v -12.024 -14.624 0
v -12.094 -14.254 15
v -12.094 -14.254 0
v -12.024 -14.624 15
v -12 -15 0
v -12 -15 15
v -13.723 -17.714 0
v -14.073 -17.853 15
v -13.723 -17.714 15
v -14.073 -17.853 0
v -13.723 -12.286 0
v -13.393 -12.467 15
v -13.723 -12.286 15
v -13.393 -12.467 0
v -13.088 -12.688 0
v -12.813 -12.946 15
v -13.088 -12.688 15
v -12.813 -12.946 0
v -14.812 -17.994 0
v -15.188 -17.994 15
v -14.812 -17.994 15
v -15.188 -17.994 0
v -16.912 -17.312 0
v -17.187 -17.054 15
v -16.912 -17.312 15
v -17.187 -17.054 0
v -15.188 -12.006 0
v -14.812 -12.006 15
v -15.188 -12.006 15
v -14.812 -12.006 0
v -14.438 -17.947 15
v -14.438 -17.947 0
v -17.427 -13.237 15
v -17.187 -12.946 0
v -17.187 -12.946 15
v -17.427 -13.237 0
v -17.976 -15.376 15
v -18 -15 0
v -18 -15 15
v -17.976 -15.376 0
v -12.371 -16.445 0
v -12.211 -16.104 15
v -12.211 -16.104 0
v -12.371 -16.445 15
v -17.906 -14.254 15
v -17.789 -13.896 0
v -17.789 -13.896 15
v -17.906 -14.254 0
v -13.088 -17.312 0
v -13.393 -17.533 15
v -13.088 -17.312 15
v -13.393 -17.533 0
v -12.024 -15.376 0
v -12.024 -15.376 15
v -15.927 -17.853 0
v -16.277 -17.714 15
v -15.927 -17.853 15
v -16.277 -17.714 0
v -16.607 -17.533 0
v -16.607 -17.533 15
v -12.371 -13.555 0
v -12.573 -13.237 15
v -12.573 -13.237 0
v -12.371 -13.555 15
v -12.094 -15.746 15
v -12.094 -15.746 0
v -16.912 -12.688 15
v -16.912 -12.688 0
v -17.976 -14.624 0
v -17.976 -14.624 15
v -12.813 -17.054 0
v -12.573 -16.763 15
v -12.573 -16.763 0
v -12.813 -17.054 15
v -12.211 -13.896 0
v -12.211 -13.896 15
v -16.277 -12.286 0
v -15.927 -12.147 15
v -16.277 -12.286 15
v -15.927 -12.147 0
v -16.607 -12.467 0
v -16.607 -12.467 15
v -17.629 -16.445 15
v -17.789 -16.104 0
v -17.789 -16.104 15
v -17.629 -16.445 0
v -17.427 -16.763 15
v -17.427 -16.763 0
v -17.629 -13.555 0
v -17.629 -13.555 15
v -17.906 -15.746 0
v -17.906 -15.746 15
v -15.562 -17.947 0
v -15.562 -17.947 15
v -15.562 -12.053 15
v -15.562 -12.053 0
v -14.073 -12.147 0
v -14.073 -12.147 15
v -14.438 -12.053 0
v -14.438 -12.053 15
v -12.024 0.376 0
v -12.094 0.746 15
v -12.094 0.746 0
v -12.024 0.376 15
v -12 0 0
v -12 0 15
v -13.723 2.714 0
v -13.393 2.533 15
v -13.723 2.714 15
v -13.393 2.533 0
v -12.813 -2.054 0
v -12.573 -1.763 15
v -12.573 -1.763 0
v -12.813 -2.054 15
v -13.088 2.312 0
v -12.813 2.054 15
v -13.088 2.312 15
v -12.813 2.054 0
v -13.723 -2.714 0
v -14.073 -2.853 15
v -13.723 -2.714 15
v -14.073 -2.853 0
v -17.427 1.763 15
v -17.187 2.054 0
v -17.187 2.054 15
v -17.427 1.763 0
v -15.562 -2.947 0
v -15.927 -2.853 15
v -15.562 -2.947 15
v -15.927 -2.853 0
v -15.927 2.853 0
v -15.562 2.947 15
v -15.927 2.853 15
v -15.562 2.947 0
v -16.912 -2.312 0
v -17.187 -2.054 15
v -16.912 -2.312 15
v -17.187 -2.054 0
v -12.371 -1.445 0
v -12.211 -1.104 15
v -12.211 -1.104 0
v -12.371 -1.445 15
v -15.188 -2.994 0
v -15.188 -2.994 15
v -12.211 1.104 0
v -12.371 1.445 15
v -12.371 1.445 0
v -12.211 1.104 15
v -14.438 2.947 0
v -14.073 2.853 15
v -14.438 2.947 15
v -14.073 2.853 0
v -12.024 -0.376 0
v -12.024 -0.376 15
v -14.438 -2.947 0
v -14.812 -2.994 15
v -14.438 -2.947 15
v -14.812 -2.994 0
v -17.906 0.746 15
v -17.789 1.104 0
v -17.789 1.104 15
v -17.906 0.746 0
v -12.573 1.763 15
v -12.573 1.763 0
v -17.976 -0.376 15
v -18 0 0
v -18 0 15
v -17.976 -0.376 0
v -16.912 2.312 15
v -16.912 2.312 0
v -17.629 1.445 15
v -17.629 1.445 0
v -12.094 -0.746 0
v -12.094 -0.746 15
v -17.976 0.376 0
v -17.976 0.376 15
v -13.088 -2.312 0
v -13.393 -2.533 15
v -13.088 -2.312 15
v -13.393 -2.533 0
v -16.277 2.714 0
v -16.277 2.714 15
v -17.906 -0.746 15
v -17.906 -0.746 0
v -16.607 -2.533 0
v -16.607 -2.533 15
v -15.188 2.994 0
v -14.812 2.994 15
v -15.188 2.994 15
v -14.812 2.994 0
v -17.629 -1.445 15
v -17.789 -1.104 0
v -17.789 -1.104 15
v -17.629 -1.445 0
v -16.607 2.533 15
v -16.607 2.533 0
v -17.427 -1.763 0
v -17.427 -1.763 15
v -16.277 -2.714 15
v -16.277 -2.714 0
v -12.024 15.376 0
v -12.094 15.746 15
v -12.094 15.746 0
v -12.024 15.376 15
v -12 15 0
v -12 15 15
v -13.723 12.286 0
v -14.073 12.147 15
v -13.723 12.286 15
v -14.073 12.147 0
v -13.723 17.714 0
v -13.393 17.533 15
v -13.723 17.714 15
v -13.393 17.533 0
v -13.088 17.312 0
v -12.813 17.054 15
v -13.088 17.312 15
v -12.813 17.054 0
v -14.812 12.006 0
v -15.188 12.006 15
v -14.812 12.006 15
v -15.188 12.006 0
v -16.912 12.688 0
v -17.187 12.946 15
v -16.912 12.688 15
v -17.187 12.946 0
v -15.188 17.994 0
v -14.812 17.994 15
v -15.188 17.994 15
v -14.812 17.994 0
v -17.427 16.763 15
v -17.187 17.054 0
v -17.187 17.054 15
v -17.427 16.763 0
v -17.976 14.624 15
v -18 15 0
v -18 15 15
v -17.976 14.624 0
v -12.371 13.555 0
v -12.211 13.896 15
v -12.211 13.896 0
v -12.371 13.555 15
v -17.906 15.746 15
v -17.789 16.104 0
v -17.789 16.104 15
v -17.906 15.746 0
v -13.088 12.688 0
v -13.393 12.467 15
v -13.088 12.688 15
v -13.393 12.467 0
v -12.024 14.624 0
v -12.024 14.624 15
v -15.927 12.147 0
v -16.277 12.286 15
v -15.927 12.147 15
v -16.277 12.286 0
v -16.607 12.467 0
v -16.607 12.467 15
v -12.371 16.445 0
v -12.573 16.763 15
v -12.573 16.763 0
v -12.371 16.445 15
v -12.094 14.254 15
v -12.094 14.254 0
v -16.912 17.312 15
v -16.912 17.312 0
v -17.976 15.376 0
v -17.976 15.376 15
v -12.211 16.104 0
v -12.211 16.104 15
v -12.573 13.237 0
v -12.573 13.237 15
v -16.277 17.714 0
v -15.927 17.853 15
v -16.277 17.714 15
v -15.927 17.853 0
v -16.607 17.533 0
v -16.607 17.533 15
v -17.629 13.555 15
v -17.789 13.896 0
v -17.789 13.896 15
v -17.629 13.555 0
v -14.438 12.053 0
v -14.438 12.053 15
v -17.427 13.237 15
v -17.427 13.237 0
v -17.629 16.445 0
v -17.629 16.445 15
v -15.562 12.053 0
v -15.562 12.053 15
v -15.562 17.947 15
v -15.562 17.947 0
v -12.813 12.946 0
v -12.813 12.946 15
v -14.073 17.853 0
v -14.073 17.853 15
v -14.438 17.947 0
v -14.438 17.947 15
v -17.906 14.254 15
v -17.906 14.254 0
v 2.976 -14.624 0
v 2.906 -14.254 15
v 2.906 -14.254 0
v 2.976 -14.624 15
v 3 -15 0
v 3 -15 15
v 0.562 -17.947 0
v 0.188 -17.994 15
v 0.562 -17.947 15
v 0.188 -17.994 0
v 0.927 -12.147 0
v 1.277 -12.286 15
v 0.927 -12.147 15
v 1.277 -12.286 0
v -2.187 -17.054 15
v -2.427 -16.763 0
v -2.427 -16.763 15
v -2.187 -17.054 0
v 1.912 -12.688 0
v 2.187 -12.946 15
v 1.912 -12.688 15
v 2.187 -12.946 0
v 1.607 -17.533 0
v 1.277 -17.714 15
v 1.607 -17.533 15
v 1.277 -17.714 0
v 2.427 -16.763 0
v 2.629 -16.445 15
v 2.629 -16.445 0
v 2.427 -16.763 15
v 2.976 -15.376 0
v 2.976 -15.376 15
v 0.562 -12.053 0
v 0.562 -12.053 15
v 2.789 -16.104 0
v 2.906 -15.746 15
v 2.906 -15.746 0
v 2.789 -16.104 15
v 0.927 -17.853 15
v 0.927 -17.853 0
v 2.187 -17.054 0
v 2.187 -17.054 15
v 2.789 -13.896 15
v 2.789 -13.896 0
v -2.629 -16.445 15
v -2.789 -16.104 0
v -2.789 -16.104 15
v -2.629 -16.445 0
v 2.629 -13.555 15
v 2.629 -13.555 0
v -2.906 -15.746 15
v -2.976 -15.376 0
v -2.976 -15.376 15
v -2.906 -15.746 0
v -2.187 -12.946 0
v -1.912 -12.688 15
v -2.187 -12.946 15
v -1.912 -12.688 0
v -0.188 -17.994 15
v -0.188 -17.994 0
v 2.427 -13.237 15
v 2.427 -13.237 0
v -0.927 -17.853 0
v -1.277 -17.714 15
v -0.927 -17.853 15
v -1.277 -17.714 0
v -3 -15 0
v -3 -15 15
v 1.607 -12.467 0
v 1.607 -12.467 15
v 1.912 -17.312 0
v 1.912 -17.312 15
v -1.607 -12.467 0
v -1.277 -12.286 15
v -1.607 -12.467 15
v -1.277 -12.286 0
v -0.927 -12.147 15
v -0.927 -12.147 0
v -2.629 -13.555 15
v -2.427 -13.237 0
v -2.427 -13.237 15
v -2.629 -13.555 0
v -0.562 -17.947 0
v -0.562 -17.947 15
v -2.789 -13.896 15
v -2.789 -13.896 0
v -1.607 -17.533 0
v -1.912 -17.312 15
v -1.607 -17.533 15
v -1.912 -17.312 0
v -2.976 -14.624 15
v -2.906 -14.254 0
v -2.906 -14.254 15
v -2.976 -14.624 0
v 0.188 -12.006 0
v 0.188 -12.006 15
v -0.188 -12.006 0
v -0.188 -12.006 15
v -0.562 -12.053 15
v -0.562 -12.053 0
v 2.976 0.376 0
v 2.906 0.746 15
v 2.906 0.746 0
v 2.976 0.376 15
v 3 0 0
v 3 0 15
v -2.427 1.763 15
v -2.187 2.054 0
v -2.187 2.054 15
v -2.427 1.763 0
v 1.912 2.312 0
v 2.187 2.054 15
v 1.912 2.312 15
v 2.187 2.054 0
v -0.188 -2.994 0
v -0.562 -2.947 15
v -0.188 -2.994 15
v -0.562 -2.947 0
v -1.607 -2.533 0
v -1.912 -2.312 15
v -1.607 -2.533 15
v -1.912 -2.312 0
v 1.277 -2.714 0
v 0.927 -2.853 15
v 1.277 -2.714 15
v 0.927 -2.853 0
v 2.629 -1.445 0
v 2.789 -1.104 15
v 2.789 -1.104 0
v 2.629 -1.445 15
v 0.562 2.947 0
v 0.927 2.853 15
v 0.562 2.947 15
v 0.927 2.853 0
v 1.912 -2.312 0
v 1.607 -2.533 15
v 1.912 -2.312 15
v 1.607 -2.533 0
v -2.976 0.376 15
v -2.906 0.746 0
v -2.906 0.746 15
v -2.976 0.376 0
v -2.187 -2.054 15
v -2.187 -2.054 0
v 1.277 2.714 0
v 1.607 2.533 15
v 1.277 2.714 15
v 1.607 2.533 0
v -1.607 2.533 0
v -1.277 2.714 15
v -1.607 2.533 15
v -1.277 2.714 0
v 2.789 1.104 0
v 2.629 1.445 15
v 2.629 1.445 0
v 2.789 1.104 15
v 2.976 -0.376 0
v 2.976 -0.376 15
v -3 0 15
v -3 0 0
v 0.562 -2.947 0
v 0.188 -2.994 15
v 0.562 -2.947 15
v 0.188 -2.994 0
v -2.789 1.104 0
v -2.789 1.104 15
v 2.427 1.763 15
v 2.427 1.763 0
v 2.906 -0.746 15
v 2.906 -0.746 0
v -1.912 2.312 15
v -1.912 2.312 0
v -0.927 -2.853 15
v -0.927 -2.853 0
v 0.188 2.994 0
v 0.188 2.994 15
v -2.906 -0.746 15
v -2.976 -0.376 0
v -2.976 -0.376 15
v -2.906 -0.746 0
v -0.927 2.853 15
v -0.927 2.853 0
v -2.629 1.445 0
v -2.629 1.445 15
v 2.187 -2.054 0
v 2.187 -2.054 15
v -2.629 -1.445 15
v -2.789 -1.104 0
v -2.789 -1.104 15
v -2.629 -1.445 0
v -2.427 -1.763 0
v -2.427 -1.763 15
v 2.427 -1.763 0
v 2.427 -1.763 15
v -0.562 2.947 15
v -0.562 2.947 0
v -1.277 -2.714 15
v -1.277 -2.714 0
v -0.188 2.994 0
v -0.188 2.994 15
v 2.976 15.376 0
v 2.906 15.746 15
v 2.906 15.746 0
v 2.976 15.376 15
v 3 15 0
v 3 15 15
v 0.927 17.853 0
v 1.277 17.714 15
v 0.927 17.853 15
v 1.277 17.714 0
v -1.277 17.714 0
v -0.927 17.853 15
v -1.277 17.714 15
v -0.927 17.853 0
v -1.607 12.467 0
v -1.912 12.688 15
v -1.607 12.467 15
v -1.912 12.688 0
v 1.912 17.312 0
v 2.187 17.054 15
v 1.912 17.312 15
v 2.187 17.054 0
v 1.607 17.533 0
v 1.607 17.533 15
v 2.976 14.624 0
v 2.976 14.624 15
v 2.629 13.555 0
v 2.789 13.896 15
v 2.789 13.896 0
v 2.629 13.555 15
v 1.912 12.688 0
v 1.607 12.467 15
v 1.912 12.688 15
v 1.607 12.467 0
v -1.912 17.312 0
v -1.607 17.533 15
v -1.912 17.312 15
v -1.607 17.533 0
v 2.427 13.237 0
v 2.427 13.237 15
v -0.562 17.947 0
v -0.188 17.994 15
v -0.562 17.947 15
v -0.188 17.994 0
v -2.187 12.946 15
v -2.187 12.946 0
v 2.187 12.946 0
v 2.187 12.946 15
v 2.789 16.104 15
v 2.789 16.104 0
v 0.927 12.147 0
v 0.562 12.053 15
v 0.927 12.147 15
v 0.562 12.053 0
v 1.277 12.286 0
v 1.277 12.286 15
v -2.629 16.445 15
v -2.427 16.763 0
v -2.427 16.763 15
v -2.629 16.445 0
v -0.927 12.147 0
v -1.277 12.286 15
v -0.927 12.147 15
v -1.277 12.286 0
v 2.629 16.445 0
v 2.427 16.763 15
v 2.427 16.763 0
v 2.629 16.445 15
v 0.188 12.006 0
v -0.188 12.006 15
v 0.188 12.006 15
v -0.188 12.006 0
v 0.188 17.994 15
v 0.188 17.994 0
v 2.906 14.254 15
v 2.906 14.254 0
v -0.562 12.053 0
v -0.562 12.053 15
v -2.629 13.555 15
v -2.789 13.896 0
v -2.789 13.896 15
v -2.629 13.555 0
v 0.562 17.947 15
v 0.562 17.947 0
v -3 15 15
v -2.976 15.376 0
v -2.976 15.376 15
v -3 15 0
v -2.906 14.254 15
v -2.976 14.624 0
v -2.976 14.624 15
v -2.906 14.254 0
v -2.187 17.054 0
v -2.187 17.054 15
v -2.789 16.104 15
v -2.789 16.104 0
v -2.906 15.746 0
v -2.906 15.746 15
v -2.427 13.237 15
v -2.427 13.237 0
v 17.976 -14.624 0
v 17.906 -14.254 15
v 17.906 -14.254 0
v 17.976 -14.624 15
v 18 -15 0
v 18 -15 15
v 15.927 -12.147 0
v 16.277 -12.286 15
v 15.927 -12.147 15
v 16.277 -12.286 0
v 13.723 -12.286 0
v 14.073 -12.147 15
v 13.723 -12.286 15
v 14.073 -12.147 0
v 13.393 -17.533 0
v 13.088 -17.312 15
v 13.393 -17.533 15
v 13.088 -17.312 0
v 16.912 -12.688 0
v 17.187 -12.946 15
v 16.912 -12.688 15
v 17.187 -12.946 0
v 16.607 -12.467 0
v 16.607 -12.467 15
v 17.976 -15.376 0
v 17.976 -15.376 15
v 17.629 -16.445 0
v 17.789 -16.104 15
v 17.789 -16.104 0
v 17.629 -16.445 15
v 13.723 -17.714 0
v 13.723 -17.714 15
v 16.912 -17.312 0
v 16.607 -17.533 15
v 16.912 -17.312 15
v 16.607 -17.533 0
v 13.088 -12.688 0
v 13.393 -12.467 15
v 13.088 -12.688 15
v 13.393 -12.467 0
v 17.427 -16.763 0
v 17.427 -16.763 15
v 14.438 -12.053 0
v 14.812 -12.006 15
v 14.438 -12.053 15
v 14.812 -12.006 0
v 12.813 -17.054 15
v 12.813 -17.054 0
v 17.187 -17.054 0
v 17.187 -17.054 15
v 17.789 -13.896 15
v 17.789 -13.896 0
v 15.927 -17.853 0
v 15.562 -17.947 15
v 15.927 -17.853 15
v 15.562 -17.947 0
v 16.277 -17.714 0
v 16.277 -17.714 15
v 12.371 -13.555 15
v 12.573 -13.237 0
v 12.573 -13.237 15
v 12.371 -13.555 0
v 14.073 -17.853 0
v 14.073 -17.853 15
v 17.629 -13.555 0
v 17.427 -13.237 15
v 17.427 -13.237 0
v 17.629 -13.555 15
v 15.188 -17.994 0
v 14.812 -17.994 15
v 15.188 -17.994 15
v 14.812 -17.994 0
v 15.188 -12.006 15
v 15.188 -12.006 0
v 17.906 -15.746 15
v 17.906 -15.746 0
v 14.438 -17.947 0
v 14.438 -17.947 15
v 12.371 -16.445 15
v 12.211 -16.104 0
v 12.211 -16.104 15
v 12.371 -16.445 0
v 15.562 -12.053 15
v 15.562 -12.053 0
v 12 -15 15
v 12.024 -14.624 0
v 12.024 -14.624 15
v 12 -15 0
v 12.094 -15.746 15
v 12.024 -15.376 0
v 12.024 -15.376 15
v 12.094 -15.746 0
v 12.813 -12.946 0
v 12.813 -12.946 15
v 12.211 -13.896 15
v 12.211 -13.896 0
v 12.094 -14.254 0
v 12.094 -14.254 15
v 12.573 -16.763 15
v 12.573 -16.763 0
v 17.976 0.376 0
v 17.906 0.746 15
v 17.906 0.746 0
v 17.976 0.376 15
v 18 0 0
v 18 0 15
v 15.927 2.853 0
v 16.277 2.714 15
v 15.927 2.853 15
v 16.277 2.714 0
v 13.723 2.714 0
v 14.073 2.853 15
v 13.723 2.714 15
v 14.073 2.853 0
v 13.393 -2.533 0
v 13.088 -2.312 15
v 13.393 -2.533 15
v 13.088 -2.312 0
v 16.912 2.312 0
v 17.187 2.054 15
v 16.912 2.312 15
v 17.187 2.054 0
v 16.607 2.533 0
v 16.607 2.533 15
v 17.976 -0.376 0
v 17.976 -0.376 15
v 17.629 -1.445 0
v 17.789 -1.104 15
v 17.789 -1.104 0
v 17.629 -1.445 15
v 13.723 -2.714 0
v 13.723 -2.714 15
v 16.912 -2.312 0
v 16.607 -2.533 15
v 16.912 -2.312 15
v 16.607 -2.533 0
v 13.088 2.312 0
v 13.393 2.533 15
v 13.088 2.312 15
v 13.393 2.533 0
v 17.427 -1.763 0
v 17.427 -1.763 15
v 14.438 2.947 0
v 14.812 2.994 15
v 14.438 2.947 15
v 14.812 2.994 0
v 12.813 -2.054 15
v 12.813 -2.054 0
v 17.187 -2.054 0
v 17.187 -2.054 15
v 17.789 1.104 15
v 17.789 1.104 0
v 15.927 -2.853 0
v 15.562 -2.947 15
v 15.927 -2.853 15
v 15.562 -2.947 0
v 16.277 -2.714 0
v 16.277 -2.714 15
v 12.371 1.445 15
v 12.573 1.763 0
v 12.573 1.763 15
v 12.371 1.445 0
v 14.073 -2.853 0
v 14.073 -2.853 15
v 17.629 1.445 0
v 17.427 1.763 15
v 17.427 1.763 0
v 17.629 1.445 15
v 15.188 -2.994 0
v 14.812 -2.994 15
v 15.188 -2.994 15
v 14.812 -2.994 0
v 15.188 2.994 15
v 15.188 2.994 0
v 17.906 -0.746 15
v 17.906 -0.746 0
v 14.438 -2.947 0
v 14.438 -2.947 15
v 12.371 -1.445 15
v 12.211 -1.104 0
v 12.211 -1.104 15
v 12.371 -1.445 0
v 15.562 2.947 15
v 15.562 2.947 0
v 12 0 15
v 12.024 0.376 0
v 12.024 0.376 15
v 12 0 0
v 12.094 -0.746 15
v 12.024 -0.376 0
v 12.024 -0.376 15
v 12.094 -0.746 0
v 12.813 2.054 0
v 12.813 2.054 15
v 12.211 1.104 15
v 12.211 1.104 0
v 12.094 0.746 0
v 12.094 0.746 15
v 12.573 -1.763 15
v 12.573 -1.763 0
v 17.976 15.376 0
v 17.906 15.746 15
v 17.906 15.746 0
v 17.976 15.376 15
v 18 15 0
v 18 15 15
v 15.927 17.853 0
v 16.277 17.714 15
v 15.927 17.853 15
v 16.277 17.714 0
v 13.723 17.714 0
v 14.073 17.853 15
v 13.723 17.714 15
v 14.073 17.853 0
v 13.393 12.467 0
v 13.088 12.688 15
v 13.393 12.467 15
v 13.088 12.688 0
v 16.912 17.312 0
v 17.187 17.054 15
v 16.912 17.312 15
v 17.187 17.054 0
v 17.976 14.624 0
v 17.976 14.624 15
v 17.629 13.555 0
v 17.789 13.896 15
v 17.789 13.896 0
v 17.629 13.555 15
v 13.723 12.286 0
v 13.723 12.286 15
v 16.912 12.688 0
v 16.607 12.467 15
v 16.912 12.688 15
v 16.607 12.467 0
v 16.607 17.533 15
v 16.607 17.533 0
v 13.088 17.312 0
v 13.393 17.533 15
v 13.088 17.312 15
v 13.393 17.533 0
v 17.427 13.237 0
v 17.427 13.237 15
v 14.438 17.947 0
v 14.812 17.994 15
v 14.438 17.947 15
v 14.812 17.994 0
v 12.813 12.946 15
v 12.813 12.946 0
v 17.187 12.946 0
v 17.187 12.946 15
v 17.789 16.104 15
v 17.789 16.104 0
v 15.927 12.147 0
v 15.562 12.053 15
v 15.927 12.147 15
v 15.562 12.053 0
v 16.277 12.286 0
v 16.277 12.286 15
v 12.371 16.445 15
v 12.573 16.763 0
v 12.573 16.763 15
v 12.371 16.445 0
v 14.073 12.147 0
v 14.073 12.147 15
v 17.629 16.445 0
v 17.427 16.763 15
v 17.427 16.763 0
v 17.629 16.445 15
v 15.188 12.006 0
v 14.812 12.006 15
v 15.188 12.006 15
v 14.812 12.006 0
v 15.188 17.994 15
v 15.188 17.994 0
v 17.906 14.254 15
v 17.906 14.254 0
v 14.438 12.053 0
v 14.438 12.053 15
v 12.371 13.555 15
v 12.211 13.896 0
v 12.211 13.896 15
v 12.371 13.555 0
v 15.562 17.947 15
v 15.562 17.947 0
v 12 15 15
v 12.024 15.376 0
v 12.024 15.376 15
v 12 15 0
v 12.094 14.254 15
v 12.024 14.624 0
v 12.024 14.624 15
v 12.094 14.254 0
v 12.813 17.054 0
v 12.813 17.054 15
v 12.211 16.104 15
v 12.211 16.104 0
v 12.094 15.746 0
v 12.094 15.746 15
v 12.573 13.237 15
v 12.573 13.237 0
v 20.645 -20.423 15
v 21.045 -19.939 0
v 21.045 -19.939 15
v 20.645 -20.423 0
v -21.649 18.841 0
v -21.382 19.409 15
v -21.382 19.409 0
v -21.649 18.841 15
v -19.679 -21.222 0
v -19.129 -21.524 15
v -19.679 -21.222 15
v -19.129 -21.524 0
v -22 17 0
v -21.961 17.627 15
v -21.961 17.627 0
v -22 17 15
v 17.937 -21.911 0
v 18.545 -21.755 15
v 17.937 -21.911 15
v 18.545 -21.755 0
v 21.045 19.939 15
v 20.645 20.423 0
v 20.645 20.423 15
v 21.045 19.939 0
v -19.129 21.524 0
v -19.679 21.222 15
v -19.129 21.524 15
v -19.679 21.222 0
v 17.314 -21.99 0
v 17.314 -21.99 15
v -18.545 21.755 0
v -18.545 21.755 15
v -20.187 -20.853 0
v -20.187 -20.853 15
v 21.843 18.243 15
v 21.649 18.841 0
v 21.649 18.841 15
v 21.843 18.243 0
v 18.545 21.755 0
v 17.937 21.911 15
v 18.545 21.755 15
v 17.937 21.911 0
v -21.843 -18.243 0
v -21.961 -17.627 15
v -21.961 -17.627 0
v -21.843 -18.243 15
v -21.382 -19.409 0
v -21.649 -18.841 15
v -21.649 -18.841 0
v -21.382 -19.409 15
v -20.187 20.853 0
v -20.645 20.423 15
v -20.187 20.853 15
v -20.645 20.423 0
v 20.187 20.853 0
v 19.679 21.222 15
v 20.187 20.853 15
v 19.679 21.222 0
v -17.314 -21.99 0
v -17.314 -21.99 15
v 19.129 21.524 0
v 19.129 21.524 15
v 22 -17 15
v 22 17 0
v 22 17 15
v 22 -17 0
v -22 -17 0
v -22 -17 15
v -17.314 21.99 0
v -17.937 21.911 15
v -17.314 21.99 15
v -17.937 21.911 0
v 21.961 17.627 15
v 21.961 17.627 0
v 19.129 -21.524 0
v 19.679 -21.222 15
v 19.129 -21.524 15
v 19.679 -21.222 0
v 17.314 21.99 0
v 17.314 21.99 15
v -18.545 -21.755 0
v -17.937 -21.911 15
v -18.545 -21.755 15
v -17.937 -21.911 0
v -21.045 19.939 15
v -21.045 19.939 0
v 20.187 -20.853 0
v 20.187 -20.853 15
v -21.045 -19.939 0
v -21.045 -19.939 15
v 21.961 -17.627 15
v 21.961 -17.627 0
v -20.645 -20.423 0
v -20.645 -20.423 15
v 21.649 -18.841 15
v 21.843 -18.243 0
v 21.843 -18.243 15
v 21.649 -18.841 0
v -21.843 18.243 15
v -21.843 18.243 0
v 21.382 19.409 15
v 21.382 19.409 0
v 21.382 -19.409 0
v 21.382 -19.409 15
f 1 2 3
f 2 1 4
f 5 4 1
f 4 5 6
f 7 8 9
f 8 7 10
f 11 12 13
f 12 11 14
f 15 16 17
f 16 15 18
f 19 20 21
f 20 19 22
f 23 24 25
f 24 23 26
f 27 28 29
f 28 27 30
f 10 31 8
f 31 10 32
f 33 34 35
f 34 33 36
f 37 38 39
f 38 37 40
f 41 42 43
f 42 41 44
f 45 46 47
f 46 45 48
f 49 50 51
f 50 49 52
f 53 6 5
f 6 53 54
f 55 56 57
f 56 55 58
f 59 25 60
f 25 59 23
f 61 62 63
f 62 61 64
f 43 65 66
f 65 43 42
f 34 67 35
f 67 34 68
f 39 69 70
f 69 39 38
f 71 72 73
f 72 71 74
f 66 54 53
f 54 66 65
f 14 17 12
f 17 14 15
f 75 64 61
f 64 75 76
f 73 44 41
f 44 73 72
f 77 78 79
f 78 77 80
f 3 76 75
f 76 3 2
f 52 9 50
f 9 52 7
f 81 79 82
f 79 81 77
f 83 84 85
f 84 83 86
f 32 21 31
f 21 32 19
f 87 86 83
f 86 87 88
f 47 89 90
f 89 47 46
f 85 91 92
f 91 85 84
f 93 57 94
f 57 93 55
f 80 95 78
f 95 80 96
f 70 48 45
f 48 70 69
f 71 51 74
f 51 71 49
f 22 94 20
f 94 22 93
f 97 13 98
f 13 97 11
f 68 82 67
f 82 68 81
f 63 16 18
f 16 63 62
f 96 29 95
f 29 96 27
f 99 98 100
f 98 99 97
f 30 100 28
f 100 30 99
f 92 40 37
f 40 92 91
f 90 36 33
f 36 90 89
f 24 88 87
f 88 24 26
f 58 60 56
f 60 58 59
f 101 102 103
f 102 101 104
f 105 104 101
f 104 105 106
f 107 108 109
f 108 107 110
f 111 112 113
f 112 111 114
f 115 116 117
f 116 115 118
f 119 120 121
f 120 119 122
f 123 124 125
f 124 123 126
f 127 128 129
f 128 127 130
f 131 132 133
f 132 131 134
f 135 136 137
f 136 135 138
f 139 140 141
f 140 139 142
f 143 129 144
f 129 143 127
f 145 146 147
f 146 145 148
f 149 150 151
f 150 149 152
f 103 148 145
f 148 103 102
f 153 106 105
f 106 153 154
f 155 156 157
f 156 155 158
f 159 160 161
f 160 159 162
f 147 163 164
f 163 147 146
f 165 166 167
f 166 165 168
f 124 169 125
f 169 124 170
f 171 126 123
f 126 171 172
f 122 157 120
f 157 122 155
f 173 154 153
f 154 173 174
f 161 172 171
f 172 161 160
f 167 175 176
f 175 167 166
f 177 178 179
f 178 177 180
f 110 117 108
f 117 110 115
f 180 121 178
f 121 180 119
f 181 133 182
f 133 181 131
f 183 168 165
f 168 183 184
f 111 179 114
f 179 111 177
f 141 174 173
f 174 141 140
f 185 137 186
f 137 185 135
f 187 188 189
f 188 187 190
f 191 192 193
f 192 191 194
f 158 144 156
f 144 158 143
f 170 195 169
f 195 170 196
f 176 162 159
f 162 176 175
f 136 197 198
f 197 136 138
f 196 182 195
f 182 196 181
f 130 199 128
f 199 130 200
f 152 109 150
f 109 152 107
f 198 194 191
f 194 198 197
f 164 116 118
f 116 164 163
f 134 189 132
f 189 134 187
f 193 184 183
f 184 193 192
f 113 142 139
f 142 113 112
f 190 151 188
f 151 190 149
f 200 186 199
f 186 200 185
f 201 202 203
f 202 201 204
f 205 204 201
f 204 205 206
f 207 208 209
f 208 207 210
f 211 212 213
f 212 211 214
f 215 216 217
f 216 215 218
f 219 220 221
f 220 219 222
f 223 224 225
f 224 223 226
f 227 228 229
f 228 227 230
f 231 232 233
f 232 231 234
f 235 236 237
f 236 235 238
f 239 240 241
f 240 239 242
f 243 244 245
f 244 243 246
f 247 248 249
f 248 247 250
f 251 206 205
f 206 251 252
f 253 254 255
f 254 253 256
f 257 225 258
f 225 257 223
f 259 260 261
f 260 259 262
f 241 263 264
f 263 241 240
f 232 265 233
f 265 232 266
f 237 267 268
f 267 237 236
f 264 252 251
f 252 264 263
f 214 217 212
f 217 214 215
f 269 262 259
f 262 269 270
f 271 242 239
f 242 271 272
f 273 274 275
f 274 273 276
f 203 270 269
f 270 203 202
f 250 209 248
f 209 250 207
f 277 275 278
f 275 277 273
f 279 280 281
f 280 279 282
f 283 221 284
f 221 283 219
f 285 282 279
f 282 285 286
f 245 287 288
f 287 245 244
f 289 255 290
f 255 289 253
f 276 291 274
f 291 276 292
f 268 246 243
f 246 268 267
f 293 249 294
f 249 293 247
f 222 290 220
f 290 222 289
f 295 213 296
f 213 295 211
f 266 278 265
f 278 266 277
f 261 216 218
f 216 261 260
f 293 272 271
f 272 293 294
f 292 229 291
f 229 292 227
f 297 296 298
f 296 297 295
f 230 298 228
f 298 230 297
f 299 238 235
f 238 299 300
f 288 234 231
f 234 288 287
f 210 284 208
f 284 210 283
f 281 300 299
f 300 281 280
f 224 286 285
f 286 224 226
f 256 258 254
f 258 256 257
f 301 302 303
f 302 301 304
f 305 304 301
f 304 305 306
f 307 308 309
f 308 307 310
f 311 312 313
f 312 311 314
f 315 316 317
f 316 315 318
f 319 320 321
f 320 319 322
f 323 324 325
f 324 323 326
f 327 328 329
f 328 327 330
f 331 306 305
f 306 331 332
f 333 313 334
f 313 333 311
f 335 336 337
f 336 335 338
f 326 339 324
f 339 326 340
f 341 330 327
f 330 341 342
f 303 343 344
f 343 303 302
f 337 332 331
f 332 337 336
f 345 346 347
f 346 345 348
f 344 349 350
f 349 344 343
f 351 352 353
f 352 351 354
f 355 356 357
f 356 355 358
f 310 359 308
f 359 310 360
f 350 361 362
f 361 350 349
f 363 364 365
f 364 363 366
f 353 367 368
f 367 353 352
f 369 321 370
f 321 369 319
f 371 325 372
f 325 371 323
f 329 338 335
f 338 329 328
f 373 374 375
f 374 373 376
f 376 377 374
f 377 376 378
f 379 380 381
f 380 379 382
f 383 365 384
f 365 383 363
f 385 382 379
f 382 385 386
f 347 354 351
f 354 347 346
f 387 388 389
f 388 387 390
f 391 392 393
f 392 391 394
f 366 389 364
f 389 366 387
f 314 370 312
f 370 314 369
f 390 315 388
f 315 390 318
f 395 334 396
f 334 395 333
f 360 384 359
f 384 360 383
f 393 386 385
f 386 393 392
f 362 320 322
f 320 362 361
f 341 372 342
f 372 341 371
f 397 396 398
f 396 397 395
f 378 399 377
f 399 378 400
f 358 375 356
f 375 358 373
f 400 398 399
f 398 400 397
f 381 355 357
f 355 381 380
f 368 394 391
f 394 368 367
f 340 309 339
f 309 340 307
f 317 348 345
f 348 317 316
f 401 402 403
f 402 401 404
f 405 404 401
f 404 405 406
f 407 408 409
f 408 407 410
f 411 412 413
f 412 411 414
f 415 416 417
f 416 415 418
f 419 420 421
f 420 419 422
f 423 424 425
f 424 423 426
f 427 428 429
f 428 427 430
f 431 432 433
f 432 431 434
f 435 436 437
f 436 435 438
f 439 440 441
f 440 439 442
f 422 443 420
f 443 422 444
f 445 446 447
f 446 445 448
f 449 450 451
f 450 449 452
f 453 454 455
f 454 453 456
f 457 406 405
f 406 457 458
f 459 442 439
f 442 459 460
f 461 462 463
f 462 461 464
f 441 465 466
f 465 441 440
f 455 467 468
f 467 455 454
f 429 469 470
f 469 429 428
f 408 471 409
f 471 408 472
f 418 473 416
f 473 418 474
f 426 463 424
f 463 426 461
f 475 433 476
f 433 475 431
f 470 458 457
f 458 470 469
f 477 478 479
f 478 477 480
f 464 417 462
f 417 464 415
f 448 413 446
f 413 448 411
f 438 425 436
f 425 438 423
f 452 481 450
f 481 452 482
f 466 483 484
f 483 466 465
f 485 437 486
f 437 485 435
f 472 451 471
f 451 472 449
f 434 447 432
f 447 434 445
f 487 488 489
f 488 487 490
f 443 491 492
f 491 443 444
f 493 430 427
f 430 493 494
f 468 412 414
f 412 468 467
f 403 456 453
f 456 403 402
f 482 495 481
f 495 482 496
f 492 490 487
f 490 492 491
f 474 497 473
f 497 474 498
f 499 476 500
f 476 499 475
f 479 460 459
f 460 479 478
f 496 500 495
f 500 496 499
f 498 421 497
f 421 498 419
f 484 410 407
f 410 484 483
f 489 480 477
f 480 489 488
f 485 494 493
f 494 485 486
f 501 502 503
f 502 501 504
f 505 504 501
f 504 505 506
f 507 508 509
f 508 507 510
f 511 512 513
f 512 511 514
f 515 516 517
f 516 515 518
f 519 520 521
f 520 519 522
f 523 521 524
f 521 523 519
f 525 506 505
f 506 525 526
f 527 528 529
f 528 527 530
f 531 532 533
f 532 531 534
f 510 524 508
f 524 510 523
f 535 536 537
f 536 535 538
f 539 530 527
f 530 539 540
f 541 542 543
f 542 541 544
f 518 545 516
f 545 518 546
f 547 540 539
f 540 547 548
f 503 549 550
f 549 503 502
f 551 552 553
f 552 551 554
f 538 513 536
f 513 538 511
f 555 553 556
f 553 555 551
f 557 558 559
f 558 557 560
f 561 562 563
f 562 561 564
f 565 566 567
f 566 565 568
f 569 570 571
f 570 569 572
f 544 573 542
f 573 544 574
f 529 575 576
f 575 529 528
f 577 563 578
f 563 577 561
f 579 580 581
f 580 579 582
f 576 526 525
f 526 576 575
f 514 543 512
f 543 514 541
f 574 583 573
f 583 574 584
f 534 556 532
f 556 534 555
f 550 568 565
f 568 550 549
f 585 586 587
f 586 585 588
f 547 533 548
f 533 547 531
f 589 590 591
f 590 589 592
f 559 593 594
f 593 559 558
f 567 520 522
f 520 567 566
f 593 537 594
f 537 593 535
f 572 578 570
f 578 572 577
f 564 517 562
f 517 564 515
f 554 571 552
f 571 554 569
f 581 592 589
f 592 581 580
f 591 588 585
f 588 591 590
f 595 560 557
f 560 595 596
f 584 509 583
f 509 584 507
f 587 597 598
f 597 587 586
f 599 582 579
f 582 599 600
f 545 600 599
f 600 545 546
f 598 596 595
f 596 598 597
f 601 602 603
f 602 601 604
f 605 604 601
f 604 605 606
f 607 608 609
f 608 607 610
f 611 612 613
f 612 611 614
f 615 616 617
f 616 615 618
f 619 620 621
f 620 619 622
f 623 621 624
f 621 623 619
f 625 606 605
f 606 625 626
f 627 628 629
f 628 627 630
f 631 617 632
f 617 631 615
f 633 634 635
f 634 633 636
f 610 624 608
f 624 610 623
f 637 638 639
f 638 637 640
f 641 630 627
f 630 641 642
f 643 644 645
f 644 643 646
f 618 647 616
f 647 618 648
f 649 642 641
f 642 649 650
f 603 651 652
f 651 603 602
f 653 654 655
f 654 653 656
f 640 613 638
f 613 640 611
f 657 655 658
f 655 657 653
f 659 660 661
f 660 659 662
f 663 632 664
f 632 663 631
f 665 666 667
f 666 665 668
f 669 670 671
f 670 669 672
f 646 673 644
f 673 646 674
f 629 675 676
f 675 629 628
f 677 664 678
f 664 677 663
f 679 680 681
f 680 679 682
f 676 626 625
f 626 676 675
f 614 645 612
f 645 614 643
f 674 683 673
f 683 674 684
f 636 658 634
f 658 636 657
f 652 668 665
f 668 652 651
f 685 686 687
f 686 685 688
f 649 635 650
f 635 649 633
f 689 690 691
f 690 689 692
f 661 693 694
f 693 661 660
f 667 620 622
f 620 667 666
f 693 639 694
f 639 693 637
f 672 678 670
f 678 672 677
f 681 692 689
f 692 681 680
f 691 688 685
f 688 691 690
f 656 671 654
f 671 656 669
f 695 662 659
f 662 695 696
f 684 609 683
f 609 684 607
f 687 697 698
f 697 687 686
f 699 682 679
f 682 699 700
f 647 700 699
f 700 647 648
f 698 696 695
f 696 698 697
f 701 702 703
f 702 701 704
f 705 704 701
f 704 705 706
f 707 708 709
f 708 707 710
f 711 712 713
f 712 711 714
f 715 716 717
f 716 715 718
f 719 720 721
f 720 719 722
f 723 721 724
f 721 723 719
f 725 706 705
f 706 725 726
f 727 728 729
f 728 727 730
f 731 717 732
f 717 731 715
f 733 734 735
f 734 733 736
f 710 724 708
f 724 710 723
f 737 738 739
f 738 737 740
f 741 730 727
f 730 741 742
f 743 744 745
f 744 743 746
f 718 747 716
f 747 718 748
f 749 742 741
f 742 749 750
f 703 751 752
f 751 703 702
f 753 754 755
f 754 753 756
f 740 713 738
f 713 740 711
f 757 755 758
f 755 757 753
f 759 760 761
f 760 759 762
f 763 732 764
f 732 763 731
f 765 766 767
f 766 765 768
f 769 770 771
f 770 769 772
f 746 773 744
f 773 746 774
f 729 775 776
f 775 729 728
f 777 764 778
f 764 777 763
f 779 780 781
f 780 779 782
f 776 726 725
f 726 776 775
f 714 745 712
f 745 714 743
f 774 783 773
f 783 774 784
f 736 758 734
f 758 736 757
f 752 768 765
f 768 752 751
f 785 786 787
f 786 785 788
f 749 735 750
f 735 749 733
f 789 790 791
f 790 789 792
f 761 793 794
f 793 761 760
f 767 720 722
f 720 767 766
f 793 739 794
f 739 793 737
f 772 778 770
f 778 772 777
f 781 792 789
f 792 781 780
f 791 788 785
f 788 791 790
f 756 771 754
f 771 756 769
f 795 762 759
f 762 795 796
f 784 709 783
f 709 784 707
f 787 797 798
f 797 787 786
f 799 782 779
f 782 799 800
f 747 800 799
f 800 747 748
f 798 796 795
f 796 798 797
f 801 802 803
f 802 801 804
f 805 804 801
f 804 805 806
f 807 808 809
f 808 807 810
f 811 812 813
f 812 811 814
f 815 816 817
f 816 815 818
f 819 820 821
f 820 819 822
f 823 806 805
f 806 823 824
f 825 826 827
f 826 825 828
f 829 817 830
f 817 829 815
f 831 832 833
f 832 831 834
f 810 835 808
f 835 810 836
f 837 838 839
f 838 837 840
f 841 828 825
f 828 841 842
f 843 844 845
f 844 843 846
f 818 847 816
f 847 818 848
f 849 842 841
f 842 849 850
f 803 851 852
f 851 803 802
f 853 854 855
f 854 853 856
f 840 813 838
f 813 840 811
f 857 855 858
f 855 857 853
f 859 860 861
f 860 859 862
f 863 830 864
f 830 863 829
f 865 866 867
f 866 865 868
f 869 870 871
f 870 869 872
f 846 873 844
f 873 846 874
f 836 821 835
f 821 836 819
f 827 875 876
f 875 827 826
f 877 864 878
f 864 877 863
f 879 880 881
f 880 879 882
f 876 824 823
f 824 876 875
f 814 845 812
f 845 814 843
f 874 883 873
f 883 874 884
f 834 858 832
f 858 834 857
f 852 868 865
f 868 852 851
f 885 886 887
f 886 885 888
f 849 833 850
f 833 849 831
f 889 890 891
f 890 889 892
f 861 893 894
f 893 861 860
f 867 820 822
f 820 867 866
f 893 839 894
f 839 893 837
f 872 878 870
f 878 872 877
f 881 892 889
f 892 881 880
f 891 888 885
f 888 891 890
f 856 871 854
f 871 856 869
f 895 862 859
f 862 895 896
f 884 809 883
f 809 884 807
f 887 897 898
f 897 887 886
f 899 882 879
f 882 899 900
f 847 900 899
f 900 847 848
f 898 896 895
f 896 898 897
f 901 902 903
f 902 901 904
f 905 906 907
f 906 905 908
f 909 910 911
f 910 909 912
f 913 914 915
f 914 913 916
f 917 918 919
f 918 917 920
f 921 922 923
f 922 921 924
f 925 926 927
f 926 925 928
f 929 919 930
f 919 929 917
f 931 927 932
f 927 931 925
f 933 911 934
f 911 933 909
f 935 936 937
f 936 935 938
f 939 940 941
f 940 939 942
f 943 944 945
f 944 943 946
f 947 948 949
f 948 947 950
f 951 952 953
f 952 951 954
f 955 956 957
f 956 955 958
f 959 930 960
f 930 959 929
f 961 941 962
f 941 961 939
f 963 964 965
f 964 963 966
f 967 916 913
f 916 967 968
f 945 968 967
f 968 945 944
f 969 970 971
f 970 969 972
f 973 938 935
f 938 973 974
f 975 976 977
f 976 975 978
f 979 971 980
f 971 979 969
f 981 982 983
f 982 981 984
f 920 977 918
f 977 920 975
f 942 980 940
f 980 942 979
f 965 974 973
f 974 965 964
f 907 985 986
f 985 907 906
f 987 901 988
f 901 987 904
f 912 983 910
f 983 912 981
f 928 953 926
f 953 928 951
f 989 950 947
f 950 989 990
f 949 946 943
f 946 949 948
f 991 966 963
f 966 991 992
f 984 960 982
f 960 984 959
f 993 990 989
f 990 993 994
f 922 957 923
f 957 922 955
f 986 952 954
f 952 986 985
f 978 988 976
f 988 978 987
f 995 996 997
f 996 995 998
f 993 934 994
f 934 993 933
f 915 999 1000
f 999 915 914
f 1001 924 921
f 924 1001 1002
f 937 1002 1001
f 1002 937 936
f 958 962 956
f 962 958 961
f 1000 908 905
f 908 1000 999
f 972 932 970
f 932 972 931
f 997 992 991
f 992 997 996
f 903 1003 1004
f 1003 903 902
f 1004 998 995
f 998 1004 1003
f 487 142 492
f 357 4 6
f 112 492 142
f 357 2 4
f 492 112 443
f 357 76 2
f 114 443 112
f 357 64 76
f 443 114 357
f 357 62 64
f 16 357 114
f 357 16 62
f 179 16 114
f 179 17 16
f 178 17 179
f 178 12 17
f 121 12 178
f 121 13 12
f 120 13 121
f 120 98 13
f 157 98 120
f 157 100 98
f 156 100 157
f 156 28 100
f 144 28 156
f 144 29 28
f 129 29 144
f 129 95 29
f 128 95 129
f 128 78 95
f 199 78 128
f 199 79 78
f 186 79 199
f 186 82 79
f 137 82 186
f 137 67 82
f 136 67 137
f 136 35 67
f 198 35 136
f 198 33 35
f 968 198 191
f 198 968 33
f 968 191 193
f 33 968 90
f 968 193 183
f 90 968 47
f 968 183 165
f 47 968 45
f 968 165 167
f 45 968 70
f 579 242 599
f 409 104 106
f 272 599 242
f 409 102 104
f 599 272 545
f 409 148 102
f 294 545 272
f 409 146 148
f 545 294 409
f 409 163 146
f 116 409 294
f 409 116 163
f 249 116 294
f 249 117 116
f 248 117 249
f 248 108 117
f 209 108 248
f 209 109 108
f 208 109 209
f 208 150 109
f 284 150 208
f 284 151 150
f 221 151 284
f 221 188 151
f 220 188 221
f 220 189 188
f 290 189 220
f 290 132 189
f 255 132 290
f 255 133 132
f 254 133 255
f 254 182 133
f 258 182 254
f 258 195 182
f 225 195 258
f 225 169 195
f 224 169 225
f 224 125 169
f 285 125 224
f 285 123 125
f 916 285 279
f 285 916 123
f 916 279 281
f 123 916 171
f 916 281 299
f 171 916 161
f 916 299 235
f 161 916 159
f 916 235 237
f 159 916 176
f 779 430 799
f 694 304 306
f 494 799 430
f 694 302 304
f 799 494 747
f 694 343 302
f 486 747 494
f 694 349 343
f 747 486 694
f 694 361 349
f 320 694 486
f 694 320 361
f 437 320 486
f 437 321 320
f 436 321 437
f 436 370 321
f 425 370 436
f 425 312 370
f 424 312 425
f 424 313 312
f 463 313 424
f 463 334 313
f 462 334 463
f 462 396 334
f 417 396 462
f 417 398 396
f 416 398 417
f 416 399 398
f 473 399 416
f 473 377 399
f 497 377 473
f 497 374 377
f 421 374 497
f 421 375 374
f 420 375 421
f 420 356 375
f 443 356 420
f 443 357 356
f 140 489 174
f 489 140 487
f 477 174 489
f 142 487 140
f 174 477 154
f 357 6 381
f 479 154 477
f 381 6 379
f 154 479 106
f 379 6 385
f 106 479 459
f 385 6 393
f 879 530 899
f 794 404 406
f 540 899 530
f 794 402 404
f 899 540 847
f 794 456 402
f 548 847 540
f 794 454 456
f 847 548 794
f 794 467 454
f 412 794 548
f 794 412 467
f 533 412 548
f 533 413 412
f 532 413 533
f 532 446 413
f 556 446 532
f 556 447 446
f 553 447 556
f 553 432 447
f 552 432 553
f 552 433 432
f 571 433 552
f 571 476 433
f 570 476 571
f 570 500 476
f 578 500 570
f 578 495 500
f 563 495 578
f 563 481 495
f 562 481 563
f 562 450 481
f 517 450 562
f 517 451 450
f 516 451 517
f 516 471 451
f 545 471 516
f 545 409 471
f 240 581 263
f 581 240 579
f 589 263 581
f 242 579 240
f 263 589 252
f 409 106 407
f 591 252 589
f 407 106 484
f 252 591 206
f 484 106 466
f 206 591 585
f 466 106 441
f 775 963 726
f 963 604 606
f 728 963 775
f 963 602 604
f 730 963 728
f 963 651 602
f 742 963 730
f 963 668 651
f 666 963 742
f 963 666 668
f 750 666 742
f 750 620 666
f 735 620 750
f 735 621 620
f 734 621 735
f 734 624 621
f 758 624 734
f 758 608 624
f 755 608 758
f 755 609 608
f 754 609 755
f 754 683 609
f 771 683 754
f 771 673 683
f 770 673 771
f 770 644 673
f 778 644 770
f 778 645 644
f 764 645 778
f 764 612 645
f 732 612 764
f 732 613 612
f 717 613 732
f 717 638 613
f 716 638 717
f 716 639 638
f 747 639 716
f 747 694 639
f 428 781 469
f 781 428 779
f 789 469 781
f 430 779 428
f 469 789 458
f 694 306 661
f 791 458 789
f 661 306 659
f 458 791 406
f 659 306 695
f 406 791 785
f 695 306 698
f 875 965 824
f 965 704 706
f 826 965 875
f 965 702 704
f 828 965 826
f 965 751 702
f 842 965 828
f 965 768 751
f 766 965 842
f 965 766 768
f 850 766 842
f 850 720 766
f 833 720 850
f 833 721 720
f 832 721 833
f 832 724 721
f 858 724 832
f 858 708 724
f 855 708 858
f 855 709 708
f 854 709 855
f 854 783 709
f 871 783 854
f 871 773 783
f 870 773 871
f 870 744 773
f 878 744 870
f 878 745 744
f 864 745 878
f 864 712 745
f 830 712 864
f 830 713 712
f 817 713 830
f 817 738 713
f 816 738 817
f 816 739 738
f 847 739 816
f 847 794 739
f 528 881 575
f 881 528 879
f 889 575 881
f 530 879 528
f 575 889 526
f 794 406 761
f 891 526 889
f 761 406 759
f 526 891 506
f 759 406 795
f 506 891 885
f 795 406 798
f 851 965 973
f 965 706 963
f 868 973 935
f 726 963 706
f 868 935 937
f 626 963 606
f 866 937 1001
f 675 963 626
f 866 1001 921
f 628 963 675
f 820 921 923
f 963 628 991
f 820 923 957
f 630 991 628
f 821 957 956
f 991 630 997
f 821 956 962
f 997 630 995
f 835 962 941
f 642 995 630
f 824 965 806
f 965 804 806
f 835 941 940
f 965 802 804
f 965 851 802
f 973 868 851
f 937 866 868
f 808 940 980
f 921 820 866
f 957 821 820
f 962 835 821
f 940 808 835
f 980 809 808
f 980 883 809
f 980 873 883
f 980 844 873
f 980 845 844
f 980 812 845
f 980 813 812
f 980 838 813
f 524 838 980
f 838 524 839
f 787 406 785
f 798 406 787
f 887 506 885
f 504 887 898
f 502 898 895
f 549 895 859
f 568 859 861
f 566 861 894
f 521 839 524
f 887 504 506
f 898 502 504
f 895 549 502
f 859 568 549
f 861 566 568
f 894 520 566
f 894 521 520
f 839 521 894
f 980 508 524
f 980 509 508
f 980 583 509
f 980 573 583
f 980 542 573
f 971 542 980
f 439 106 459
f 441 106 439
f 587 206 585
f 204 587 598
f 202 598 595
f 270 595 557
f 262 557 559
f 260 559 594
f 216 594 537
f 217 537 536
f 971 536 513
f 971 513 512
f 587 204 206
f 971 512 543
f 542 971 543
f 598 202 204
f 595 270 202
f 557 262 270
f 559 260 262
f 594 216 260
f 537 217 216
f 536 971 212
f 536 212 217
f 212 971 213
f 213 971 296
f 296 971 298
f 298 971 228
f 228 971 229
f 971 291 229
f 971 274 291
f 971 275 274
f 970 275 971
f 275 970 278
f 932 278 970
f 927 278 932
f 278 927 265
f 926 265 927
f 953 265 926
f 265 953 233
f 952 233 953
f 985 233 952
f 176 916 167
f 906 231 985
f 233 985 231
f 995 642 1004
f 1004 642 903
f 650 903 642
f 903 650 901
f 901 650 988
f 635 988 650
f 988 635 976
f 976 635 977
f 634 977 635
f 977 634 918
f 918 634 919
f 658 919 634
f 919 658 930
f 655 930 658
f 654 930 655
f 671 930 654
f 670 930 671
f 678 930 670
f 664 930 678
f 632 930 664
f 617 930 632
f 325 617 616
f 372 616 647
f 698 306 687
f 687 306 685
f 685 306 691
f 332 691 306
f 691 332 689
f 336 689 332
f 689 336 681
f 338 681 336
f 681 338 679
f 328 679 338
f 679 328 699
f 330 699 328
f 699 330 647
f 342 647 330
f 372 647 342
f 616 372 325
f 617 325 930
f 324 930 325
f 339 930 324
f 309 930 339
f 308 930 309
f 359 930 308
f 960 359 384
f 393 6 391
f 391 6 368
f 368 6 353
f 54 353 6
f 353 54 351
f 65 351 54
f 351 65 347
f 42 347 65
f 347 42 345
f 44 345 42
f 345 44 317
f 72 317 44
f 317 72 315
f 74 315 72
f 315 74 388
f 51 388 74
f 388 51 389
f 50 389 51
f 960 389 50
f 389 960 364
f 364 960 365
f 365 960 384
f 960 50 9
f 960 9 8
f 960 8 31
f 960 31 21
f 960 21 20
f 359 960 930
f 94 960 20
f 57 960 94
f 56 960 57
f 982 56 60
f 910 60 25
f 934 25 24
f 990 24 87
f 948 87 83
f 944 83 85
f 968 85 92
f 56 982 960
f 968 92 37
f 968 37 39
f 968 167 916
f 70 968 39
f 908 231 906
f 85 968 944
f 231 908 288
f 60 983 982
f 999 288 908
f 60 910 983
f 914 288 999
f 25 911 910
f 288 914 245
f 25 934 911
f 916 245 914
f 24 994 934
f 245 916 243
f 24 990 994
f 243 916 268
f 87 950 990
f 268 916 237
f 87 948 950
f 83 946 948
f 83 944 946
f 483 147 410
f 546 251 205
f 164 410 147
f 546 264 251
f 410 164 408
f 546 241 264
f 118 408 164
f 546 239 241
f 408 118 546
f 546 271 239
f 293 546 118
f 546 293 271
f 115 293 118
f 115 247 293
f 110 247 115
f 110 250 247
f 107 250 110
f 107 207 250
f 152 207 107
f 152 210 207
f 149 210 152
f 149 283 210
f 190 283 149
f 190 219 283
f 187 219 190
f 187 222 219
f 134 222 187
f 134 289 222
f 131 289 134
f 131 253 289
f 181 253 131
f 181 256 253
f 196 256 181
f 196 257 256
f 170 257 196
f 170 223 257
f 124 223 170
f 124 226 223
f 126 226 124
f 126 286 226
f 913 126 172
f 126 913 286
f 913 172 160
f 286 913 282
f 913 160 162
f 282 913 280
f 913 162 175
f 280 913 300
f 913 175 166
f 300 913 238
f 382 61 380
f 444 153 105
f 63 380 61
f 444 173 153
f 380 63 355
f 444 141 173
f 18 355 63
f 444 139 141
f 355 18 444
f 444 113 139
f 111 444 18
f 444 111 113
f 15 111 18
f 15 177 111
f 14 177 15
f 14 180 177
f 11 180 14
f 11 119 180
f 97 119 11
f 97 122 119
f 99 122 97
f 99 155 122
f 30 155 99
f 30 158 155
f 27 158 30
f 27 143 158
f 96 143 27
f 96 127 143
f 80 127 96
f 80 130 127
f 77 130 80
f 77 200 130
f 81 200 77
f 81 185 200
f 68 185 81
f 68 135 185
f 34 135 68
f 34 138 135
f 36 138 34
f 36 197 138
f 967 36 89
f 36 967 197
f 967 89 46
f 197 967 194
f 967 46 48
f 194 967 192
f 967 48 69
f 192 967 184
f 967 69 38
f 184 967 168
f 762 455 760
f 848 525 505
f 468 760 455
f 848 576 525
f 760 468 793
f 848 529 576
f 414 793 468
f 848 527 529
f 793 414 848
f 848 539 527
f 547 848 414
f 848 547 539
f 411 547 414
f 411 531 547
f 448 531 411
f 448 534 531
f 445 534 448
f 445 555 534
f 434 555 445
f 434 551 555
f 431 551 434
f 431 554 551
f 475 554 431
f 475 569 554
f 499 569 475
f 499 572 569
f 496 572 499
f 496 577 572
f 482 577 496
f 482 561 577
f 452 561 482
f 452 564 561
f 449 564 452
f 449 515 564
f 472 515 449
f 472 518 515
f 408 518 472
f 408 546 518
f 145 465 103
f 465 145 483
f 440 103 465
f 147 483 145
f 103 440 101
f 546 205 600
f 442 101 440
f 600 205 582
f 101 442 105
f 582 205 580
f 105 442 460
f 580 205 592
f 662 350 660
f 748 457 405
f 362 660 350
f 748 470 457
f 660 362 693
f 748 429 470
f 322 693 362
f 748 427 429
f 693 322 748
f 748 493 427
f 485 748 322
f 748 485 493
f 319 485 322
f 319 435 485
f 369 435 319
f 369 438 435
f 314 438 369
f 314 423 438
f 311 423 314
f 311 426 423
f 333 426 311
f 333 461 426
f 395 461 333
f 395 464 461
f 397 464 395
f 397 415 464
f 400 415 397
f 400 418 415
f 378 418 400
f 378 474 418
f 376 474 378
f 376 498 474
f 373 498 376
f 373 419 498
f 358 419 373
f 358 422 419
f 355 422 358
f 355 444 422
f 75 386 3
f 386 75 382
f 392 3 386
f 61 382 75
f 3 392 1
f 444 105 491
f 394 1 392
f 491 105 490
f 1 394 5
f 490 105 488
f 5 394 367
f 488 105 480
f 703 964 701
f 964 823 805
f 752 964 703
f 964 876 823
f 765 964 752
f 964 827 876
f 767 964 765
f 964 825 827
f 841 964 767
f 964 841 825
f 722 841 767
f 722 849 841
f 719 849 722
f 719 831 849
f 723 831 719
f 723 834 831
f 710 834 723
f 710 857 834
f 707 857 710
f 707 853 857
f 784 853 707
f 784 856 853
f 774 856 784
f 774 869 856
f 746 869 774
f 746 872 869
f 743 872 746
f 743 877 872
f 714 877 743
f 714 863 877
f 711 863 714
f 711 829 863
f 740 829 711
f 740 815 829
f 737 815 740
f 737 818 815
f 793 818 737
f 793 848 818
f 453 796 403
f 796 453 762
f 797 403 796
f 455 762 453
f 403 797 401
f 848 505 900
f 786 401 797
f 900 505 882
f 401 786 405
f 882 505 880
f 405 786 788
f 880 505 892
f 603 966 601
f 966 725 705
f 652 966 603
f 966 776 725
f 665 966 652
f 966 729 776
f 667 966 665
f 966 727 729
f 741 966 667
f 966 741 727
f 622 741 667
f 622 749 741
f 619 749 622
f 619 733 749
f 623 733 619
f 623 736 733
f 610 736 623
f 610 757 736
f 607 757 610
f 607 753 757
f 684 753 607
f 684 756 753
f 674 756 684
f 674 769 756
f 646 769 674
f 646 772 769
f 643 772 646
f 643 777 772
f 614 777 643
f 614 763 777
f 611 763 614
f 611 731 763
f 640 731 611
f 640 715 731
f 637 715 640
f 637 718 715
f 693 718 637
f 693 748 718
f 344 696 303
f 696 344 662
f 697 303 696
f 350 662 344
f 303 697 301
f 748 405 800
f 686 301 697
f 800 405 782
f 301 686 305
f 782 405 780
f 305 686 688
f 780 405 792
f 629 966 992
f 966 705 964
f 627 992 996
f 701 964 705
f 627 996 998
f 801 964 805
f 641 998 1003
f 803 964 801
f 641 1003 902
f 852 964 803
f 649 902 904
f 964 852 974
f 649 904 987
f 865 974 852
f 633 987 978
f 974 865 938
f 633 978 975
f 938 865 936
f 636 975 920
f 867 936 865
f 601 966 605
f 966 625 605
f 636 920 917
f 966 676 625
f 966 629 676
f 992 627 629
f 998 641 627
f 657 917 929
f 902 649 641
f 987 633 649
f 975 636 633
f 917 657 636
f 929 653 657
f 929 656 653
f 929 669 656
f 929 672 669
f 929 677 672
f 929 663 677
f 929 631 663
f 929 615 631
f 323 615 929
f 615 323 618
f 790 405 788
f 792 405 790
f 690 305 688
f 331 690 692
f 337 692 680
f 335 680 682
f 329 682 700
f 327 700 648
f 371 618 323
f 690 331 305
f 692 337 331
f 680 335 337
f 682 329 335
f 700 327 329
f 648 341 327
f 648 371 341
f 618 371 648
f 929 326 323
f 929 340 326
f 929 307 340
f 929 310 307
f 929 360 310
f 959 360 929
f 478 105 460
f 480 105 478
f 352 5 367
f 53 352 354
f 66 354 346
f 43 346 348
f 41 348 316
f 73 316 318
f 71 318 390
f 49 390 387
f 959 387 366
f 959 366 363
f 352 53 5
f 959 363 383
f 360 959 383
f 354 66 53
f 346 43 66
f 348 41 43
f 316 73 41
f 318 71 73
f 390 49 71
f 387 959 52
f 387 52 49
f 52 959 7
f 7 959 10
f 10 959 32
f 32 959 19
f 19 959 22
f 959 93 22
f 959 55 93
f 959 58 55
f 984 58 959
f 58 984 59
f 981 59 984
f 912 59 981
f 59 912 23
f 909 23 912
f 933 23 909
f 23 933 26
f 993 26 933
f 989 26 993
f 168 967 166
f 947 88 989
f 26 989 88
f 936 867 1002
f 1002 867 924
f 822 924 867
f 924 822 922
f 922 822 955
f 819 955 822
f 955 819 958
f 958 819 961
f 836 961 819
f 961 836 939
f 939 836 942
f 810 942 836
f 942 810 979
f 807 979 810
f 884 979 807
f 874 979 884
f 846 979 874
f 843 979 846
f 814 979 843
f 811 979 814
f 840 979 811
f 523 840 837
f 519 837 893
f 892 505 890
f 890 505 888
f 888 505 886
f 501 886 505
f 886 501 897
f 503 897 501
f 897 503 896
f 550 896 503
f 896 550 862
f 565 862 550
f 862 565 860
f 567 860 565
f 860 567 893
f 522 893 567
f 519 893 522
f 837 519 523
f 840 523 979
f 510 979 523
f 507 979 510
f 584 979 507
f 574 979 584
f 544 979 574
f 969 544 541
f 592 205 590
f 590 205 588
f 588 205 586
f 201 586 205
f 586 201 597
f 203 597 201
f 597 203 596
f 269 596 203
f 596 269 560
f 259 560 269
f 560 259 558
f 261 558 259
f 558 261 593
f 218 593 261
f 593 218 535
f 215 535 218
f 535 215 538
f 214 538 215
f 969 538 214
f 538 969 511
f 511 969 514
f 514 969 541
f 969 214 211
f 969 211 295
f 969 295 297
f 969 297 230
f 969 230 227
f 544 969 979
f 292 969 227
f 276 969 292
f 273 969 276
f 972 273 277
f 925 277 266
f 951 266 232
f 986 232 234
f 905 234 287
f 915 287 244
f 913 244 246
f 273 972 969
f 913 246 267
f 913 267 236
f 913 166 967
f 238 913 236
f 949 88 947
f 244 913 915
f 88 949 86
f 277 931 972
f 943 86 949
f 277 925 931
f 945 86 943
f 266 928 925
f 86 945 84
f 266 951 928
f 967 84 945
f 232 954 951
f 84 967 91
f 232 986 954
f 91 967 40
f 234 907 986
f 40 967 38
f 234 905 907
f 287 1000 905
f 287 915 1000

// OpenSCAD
$fn = 50;


difference() {
	union() {
		hull() {
			translate(v = [-17.0000000000, 17.0000000000, 0]) {
				cylinder(h = 15, r = 5);
			}
			translate(v = [17.0000000000, 17.0000000000, 0]) {
				cylinder(h = 15, r = 5);
			}
			translate(v = [-17.0000000000, -17.0000000000, 0]) {
				cylinder(h = 15, r = 5);
			}
			translate(v = [17.0000000000, -17.0000000000, 0]) {
				cylinder(h = 15, r = 5);
			}
		}
	}
	union() {
		translate(v = [-15.0000000000, -15.0000000000, 0]) {
			translate(v = [0, 0, -100]) {
				cylinder(h = 200, r = 3.0000000000);
			}
		}
		translate(v = [-15.0000000000, 0.0000000000, 0]) {
			translate(v = [0, 0, -100]) {
				cylinder(h = 200, r = 3.0000000000);
			}
		}
		translate(v = [-15.0000000000, 15.0000000000, 0]) {
			translate(v = [0, 0, -100]) {
				cylinder(h = 200, r = 3.0000000000);
			}
		}
		translate(v = [0.0000000000, -15.0000000000, 0]) {
			translate(v = [0, 0, -100]) {
				cylinder(h = 200, r = 3.0000000000);
			}
		}
		translate(v = [0, 0, -100]) {
			cylinder(h = 200, r = 3.0000000000);
		}
		translate(v = [0.0000000000, 15.0000000000, 0]) {
			translate(v = [0, 0, -100]) {
				cylinder(h = 200, r = 3.0000000000);
			}
		}
		translate(v = [15.0000000000, -15.0000000000, 0]) {
			translate(v = [0, 0, -100]) {
				cylinder(h = 200, r = 3.0000000000);
			}
		}
		translate(v = [15.0000000000, 0.0000000000, 0]) {
			translate(v = [0, 0, -100]) {
				cylinder(h = 200, r = 3.0000000000);
			}
		}
		translate(v = [15.0000000000, 15.0000000000, 0]) {
			translate(v = [0, 0, -100]) {
				cylinder(h = 200, r = 3.0000000000);
			}
		}
	}
}
